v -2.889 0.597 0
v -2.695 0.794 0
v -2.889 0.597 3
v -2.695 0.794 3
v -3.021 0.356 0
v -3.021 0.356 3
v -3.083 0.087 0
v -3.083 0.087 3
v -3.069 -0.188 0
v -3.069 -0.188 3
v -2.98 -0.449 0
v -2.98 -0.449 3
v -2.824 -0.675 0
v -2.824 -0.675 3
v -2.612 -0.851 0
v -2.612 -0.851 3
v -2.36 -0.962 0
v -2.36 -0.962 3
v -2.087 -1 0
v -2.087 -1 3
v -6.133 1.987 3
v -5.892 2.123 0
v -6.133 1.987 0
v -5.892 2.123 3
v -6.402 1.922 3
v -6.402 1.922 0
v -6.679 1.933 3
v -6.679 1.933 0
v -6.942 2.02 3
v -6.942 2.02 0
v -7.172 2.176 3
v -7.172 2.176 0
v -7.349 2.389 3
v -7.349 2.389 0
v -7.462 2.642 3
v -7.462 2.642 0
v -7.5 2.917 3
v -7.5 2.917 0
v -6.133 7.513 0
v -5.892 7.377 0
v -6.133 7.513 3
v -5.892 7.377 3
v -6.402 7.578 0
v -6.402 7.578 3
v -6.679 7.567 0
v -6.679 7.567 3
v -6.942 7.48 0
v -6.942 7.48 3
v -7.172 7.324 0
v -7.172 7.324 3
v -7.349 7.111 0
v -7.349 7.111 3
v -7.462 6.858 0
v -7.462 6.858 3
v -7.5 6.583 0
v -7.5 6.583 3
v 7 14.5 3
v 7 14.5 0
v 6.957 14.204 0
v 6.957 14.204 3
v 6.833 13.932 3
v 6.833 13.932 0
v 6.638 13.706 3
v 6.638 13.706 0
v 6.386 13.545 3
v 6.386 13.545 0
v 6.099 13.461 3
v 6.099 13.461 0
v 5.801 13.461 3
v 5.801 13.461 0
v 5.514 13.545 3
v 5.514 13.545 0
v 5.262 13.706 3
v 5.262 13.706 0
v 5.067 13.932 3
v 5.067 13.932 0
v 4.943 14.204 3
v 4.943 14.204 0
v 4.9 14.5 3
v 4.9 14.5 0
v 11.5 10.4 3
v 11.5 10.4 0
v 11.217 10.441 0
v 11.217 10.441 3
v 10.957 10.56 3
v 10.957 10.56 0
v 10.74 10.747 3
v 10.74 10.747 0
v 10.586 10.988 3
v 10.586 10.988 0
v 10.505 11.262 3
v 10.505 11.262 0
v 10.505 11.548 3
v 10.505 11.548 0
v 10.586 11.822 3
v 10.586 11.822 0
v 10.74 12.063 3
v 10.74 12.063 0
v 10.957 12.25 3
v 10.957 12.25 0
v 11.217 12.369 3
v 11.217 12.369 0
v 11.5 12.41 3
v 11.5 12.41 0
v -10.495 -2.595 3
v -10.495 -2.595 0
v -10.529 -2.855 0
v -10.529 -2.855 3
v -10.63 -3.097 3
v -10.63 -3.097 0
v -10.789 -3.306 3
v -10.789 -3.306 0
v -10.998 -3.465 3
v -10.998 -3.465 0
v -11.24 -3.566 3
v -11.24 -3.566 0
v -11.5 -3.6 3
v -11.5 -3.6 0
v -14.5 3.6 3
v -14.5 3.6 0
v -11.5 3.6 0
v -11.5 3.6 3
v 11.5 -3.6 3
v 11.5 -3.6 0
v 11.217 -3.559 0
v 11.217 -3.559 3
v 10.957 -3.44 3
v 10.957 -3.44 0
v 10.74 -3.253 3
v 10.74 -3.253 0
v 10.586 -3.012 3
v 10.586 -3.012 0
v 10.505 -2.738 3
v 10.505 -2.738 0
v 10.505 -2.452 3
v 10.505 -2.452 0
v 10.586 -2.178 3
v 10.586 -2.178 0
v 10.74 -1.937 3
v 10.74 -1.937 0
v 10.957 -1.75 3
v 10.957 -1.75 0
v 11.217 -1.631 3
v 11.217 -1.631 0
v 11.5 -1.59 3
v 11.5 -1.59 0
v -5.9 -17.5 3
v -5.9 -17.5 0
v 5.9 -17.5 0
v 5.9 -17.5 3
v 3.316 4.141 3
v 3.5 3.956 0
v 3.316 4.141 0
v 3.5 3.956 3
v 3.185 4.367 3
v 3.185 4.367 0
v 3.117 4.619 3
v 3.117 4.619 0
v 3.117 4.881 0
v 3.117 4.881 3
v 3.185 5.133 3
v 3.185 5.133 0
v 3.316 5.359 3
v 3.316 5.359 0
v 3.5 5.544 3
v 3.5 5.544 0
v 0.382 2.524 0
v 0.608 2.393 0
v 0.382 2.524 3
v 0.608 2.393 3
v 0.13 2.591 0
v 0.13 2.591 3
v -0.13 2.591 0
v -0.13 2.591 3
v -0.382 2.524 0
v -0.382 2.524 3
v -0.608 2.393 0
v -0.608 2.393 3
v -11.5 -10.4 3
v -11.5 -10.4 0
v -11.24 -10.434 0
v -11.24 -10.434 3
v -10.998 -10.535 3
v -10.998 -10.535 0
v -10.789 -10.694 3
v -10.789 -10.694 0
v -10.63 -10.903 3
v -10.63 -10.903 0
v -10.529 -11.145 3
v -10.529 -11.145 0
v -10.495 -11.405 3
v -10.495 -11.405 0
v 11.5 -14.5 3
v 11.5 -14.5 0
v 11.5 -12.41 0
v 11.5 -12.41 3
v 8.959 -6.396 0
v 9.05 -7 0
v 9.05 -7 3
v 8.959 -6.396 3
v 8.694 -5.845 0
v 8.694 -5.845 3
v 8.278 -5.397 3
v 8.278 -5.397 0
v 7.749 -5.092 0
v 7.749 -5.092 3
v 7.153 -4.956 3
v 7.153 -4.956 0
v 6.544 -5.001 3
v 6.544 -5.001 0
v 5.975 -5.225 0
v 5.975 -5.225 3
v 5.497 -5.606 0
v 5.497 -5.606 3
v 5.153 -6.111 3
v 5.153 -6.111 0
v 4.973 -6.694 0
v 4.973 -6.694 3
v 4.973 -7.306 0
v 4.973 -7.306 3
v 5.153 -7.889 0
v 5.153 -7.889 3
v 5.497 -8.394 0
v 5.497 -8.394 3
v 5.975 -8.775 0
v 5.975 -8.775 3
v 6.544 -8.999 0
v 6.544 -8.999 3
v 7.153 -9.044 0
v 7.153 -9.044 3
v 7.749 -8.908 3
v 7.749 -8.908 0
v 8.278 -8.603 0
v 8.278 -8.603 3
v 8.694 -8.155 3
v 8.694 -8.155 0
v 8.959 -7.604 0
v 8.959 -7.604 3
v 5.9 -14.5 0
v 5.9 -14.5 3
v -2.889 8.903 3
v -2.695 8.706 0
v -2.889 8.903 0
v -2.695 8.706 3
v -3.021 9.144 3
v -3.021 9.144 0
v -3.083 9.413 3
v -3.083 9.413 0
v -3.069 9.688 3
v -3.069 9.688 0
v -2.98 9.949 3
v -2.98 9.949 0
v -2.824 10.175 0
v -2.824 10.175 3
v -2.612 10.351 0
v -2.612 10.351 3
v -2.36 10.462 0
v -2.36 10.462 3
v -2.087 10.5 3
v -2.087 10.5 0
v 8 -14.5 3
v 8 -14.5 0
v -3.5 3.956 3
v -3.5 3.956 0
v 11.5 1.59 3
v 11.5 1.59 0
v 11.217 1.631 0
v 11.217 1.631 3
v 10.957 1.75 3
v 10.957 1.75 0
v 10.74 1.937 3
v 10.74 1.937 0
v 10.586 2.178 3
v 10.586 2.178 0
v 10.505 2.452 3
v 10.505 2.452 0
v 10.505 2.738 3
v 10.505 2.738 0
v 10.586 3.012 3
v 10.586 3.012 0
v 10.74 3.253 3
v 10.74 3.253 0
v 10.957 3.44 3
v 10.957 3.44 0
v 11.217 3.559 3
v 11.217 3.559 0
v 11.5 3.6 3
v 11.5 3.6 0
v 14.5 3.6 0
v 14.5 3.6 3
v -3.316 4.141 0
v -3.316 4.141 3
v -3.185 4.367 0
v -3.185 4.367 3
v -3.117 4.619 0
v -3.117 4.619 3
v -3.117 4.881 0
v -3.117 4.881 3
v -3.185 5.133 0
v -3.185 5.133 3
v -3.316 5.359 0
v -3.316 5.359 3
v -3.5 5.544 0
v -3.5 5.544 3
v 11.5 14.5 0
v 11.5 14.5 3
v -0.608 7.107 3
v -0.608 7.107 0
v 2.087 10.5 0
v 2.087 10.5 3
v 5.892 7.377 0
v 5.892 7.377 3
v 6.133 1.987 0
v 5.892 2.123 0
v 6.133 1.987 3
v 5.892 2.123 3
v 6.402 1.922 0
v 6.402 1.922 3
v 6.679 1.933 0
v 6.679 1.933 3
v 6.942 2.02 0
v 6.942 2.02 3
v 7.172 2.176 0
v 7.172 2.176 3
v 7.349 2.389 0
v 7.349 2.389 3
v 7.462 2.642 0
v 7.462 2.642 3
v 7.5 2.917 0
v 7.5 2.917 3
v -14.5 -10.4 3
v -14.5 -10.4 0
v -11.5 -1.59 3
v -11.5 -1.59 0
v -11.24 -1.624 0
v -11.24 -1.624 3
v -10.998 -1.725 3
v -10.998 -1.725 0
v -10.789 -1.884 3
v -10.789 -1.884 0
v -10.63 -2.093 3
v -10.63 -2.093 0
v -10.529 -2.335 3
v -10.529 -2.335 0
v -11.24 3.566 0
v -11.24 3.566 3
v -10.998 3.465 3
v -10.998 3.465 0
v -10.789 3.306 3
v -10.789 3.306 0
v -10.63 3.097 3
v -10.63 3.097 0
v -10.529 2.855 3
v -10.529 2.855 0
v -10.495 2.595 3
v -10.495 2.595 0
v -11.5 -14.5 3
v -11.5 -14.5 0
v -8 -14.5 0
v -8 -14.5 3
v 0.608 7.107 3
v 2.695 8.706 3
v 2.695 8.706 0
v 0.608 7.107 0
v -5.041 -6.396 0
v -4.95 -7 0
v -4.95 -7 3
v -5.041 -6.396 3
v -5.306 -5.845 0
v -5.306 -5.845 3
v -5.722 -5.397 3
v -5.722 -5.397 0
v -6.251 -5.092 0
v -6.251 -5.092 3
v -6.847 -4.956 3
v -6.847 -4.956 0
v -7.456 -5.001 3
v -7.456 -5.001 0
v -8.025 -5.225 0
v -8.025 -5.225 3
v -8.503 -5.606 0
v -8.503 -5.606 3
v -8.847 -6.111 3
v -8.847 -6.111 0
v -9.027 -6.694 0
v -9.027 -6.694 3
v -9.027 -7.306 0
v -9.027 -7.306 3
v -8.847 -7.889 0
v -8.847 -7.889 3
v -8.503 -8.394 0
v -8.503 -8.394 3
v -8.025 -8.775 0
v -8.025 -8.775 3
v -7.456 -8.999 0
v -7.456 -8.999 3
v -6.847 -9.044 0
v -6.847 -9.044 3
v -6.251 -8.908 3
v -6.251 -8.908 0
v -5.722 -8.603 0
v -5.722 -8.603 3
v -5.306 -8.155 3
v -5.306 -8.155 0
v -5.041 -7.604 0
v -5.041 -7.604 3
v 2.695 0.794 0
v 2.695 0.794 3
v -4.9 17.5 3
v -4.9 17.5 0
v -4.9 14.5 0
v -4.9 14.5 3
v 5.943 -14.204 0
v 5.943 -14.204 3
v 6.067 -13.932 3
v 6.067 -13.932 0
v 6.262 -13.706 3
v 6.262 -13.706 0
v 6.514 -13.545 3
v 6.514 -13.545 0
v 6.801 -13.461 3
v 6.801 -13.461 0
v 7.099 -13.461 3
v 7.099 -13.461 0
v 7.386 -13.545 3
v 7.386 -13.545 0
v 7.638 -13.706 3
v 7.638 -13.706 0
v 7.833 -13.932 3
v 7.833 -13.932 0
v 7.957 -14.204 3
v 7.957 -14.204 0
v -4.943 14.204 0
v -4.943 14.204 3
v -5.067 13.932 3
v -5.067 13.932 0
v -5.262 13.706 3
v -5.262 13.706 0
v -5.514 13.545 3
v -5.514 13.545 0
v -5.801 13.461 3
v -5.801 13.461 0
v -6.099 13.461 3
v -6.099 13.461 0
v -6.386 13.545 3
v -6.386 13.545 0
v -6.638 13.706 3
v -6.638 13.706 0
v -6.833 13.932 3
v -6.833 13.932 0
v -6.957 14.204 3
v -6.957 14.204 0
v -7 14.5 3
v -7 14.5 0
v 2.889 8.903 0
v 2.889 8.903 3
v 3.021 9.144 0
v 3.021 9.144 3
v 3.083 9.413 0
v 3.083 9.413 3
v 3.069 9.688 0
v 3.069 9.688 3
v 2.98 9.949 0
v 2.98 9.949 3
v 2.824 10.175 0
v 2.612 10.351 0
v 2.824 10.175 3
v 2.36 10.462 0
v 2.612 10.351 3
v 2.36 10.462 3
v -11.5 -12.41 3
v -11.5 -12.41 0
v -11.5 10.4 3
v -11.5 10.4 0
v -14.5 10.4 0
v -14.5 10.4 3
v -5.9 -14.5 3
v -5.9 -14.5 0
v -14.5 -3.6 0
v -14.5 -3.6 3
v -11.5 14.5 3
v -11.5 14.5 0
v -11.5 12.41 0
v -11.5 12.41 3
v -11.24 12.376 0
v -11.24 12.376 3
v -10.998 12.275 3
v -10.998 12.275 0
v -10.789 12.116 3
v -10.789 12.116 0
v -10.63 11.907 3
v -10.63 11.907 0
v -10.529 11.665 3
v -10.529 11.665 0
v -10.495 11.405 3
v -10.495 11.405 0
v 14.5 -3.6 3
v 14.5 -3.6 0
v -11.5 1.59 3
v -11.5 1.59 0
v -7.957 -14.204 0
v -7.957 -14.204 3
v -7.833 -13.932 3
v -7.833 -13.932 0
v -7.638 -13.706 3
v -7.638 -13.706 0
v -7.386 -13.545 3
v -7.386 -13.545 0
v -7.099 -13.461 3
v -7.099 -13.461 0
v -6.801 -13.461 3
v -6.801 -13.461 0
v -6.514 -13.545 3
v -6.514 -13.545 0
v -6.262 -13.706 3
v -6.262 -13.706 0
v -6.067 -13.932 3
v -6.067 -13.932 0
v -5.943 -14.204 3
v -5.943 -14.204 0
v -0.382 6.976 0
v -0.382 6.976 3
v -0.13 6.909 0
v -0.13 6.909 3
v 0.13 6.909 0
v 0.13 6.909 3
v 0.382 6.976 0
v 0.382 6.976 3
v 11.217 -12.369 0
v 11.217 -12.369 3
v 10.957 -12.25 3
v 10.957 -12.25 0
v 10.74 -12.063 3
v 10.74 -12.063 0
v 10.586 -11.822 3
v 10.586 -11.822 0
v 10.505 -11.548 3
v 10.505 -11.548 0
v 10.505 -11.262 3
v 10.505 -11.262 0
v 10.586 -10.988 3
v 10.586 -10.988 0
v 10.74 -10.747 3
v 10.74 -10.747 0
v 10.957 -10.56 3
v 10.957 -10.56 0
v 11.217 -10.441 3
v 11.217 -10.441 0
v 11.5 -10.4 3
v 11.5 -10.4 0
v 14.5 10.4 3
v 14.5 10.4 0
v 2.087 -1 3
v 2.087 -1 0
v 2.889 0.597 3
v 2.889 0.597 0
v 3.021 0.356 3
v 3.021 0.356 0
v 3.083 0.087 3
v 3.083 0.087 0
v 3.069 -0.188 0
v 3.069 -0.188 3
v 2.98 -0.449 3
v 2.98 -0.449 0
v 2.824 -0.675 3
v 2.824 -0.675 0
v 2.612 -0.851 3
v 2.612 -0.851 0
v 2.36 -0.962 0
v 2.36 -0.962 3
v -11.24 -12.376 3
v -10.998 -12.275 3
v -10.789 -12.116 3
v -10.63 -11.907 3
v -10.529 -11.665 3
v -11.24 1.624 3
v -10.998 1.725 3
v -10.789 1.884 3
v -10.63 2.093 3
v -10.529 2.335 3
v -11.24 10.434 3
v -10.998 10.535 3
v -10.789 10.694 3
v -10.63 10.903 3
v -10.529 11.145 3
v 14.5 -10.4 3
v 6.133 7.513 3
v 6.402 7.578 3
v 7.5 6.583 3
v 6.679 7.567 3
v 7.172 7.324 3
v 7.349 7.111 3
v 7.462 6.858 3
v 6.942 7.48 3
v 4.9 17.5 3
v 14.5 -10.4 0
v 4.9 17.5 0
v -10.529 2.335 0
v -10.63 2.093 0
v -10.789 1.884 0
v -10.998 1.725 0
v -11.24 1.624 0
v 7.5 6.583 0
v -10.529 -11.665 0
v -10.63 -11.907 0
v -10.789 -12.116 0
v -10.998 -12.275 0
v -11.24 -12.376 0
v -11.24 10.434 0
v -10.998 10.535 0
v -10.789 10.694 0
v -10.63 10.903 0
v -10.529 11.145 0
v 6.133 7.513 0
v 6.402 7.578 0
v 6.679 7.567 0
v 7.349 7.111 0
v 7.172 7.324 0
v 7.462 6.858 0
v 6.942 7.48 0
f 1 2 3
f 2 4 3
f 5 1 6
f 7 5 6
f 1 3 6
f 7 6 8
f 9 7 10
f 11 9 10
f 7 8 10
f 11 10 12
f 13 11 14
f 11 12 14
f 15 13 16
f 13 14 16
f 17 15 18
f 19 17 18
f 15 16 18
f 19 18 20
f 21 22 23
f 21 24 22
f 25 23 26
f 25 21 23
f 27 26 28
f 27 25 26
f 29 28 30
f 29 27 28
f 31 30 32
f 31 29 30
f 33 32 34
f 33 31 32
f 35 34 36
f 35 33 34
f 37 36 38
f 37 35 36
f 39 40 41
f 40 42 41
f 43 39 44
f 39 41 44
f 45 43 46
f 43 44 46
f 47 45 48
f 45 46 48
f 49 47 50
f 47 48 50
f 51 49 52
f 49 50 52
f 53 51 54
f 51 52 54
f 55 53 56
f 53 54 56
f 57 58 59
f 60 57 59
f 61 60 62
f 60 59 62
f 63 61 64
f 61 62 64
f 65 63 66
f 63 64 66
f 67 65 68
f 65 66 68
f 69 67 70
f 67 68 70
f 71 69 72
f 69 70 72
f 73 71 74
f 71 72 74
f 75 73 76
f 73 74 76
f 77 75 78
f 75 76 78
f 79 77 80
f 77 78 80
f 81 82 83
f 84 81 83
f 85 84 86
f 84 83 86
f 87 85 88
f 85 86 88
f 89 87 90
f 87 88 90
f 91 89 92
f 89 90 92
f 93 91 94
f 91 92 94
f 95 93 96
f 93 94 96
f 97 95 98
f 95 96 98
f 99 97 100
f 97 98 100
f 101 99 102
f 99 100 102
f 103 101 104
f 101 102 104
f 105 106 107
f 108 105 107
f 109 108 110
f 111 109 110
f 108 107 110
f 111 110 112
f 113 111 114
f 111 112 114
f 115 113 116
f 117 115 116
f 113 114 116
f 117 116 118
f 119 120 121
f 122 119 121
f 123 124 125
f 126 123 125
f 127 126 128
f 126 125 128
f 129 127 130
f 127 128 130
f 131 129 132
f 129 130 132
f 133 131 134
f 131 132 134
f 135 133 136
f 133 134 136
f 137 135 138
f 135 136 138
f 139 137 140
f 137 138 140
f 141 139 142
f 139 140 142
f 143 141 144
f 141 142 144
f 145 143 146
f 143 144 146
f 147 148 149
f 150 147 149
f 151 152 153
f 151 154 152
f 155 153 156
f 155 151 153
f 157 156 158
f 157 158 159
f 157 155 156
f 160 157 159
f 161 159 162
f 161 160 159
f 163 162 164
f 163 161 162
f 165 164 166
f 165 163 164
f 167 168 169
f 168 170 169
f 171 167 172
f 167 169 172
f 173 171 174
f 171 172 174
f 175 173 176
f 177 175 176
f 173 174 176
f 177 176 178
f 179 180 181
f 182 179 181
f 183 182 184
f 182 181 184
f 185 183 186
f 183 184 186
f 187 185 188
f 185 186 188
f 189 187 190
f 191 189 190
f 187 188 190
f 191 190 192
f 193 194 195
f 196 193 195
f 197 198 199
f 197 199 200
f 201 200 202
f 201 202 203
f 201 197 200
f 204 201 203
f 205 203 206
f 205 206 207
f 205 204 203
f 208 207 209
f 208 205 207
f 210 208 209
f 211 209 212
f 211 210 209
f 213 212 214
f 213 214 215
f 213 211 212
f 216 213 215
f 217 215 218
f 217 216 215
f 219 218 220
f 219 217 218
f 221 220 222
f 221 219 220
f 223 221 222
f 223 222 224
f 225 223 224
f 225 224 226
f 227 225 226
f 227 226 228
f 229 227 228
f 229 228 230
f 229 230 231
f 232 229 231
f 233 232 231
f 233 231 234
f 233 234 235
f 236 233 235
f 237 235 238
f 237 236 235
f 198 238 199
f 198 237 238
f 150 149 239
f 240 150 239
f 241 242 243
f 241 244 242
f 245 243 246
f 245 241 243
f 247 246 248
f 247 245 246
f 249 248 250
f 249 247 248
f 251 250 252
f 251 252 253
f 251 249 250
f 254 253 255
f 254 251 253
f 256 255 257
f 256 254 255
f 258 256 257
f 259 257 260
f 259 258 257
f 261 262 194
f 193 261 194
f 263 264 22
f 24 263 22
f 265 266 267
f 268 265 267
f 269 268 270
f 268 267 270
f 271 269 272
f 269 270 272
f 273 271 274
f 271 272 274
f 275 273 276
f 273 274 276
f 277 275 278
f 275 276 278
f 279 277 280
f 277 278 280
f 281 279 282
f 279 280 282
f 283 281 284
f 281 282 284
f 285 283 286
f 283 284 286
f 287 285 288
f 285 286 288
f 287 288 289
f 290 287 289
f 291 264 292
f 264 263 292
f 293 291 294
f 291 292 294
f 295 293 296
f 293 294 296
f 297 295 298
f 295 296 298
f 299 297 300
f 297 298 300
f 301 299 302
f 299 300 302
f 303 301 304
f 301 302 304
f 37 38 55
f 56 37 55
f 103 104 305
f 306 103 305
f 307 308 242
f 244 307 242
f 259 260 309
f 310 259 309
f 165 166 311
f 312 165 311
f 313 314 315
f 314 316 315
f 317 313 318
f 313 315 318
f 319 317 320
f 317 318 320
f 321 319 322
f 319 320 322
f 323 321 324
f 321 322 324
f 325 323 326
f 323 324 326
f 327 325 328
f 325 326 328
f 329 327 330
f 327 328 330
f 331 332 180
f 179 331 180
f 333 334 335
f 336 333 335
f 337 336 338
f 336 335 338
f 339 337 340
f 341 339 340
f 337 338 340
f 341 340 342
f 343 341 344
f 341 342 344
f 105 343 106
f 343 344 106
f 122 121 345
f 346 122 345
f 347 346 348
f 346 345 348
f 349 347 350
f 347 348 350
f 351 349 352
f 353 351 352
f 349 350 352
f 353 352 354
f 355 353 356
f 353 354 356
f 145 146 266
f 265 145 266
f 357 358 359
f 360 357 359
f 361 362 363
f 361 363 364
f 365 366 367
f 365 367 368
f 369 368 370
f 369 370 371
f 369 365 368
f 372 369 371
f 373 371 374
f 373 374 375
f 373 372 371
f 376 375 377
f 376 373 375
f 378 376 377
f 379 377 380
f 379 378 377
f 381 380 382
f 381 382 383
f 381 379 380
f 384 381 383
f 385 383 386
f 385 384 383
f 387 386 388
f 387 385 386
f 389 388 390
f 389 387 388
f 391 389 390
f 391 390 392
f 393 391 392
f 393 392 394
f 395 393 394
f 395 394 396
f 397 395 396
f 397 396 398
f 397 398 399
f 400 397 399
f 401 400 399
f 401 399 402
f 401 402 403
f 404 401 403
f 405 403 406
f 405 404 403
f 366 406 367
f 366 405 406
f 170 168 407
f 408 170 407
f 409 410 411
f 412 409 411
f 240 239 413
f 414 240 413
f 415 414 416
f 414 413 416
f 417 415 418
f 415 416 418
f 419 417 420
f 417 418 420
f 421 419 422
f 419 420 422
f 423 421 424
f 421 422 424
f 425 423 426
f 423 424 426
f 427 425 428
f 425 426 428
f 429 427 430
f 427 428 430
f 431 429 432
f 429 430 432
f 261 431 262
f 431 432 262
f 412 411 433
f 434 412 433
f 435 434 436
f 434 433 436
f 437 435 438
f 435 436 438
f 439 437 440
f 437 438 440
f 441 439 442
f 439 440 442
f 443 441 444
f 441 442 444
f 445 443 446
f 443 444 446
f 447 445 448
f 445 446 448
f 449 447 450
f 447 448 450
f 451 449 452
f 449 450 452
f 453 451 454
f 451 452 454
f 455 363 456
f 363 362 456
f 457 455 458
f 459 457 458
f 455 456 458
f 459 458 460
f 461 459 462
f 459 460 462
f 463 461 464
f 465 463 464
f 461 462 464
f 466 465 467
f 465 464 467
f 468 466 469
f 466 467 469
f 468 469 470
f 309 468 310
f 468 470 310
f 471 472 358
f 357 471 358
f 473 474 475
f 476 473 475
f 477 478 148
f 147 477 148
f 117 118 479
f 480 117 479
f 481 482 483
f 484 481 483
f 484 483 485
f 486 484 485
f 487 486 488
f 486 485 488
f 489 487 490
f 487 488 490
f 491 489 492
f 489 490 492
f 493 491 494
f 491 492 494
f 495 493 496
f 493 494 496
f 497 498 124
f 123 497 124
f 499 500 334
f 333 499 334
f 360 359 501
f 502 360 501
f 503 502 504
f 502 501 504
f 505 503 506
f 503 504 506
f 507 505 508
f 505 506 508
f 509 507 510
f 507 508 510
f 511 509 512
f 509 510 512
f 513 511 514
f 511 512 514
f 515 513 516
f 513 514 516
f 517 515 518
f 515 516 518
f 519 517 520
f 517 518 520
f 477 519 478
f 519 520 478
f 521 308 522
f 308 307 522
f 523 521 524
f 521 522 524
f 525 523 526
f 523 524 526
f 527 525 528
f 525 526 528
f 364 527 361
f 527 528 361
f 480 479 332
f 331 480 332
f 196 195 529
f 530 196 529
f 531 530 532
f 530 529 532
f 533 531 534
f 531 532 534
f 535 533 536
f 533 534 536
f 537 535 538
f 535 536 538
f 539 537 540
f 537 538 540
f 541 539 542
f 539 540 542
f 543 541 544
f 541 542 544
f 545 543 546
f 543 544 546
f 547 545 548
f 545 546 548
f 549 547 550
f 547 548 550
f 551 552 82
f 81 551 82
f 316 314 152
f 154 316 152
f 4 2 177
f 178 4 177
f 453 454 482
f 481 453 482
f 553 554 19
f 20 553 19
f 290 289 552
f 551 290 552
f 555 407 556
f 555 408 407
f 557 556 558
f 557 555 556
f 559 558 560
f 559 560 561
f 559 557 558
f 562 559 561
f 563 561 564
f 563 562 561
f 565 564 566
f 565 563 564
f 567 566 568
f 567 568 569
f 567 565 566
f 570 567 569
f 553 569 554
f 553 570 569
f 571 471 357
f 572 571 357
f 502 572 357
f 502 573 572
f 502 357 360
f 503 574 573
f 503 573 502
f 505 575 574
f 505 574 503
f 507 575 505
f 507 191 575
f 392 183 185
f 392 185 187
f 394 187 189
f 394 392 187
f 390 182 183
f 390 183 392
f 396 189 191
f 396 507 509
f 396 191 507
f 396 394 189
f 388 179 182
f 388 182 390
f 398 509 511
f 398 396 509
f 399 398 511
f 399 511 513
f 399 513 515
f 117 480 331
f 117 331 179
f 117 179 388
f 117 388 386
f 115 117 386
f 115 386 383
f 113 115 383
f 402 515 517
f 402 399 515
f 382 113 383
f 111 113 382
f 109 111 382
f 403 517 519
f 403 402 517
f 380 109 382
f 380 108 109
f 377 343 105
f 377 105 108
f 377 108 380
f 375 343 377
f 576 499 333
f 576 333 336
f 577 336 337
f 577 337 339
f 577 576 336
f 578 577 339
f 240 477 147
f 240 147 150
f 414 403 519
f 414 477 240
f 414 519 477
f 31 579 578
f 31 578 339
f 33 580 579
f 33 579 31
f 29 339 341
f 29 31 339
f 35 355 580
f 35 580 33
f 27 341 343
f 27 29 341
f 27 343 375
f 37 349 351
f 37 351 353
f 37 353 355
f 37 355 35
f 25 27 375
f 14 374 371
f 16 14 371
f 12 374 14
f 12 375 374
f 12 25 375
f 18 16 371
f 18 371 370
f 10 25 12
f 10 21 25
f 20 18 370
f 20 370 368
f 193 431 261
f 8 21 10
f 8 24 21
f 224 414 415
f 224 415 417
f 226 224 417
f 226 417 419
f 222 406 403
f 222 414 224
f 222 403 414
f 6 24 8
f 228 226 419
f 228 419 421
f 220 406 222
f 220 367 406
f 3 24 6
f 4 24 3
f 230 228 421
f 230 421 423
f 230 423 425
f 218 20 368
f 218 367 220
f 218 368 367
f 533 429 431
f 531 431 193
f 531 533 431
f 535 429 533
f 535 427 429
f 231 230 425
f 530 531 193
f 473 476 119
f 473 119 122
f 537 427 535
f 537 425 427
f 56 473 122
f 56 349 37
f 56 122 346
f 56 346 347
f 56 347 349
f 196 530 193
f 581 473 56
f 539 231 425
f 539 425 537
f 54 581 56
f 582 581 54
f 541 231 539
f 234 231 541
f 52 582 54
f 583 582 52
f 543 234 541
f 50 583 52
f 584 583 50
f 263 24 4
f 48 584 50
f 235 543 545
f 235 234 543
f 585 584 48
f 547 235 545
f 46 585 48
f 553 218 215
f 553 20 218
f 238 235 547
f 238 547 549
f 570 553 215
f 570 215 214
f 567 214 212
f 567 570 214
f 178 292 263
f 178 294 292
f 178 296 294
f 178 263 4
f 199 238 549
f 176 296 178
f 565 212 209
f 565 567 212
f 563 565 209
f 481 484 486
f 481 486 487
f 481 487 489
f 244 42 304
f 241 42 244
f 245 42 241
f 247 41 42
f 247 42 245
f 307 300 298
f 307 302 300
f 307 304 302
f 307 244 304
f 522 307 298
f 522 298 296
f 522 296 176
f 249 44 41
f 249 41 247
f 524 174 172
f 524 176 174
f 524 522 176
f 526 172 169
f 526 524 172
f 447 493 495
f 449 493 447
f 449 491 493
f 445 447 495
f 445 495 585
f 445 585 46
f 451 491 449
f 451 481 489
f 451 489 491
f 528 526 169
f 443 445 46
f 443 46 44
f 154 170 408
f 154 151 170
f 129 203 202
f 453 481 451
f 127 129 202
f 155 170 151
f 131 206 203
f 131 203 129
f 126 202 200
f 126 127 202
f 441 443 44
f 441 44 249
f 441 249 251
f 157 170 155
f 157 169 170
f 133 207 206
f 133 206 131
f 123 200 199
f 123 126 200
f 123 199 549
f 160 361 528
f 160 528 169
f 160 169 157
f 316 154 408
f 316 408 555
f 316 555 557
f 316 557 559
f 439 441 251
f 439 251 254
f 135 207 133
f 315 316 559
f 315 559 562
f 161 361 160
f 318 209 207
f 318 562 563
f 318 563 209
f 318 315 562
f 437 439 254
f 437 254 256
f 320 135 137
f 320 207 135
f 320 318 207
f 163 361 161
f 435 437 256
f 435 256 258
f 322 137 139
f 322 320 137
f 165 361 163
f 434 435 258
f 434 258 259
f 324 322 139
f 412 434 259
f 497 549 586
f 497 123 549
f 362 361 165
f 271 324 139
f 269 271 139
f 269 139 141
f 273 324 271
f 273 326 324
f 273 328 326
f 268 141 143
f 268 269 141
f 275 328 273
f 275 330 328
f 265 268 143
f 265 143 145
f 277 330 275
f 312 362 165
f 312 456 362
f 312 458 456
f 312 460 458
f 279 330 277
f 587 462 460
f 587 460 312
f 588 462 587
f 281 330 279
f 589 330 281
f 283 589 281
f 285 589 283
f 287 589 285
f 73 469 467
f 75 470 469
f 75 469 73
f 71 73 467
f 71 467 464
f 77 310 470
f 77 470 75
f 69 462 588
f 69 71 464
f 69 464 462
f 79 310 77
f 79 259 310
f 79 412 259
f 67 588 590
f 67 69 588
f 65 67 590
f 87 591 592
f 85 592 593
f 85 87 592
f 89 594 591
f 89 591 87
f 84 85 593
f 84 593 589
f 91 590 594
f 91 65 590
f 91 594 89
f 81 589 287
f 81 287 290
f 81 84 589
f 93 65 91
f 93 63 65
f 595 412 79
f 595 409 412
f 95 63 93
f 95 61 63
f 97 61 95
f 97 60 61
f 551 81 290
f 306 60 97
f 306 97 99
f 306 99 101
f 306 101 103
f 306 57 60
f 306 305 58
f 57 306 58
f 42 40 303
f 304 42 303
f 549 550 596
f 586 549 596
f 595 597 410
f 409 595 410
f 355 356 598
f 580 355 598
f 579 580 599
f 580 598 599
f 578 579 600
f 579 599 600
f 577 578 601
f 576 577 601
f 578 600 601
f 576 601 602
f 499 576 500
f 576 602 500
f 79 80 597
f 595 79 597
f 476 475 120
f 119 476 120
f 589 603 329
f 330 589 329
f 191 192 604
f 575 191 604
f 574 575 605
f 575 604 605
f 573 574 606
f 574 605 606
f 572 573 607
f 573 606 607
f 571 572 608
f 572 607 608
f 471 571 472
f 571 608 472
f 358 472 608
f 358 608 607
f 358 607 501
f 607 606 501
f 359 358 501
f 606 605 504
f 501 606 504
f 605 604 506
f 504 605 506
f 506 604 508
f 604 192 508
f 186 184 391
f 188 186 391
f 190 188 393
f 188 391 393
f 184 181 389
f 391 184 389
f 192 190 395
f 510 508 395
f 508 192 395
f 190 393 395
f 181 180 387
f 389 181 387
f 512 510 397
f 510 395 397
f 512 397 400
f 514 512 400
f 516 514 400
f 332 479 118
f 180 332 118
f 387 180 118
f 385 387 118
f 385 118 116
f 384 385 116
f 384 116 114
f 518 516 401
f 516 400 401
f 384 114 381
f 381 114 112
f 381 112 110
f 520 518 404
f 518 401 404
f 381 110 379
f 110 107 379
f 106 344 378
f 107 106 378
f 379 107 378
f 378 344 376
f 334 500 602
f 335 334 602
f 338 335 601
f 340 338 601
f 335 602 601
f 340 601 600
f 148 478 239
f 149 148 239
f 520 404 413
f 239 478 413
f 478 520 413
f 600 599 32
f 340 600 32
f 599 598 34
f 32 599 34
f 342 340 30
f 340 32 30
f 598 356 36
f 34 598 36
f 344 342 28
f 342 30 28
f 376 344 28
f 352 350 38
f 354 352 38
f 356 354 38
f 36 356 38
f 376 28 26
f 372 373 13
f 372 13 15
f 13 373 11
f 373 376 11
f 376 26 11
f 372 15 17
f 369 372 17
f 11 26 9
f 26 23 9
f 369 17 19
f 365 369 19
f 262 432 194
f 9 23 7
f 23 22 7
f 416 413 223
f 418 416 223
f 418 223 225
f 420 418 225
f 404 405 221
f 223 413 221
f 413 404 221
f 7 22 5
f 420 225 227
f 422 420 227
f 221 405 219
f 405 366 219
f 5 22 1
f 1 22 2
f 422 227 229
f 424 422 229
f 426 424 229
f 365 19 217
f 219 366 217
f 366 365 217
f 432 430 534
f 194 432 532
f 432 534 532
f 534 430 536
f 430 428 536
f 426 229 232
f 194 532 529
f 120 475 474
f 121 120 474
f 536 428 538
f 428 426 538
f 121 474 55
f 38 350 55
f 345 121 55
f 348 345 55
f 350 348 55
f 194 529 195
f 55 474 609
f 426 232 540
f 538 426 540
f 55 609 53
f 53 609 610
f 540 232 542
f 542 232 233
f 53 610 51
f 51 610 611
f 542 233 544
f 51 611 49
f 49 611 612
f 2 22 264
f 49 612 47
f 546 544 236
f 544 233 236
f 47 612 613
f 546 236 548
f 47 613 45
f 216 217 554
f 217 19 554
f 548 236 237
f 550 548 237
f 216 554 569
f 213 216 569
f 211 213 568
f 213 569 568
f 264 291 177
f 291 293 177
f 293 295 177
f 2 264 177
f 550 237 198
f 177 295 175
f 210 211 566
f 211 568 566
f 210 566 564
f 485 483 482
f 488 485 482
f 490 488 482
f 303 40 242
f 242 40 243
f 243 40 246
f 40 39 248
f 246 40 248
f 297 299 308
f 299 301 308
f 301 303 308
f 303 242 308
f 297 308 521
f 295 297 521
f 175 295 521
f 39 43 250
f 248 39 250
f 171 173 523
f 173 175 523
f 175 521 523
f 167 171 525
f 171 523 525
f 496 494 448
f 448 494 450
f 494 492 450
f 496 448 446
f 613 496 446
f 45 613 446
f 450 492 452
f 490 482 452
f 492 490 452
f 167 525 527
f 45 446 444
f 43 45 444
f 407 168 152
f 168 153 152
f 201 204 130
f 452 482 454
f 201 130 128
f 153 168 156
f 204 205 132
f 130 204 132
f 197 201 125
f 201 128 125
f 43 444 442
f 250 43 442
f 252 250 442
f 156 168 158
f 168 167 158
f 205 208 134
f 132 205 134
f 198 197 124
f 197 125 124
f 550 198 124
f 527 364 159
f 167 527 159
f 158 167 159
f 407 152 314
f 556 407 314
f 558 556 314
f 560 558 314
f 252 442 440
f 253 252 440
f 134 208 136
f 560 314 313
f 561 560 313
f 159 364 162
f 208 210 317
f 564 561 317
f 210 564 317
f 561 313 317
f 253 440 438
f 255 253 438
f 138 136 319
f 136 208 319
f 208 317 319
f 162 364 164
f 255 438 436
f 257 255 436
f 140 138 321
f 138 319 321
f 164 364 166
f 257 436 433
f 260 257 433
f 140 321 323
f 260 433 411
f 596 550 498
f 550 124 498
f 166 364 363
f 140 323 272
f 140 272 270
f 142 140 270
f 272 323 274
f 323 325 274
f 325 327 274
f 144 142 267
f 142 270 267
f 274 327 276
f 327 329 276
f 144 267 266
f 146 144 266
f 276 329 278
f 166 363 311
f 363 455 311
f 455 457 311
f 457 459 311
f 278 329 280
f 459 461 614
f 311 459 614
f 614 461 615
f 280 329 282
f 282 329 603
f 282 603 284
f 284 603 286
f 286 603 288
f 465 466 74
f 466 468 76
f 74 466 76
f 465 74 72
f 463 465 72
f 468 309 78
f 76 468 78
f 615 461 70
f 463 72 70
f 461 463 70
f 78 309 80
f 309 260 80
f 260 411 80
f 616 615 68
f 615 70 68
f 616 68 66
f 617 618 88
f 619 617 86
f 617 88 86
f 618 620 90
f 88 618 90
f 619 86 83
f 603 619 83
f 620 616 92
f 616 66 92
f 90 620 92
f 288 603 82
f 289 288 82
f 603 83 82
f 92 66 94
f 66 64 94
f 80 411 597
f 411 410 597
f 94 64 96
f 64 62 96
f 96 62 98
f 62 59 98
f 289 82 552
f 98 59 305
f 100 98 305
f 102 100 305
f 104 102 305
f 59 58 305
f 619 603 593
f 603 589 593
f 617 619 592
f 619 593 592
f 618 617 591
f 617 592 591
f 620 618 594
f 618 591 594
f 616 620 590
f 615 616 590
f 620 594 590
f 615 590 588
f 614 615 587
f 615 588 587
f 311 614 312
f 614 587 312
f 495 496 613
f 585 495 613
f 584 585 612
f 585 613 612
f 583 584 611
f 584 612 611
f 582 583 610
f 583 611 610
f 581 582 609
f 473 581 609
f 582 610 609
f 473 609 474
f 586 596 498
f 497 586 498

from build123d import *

# Parameters (mm, degrees)
SKETCH_1_R      = 2.05
EXTRUDE_1_DEPTH = 3
FILLET_1_R      = 1


with BuildPart() as part:
    # 草图1 → 凸台-拉伸1 (new body)
    with BuildSketch(Plane.XY):
        with BuildLine():
            Line((8, -14.5), (11.5, -14.5))
            Line((11.5, -14.5), (11.5, -12.41))
            ThreePointArc((11.5, -12.41), (10.495, -11.405), (11.5, -10.4))
            Line((11.5, -10.4), (14.5, -10.4))
            Line((14.5, -10.4), (14.5, -3.6))
            Line((14.5, -3.6), (11.5, -3.6))
            ThreePointArc((11.5, -3.6), (10.495, -2.595), (11.5, -1.59))
            Line((11.5, -1.59), (11.5, 1.59))
            ThreePointArc((11.5, 1.59), (10.495, 2.595), (11.5, 3.6))
            Line((11.5, 3.6), (14.5, 3.6))
            Line((14.5, 3.6), (14.5, 10.4))
            Line((14.5, 10.4), (11.5, 10.4))
            ThreePointArc((11.5, 10.4), (10.495, 11.405), (11.5, 12.41))
            Line((11.5, 12.41), (11.5, 14.5))
            Line((11.5, 14.5), (7, 14.5))
            ThreePointArc((7, 14.5), (5.95, 13.45), (4.9, 14.5))
            Line((4.9, 14.5), (4.9, 17.5))
            Line((4.9, 17.5), (-4.9, 17.5))
            Line((-4.9, 17.5), (-4.9, 14.5))
            ThreePointArc((-4.9, 14.5), (-5.95, 13.45), (-7, 14.5))
            Line((-7, 14.5), (-11.5, 14.5))
            Line((-11.5, 14.5), (-11.5, 12.41))
            ThreePointArc((-11.5, 12.41), (-10.789357685, 12.115642315), (-10.495, 11.405))
            ThreePointArc((-10.495, 11.405), (-10.789357685, 10.694357685), (-11.5, 10.4))
            Line((-11.5, 10.4), (-14.5, 10.4))
            Line((-14.5, 10.4), (-14.5, 3.6))
            Line((-14.5, 3.6), (-11.5, 3.6))
            ThreePointArc((-11.5, 3.6), (-10.789357685, 3.305642315), (-10.495, 2.595))
            ThreePointArc((-10.495, 2.595), (-10.789357685, 1.884357685), (-11.5, 1.59))
            Line((-11.5, 1.59), (-11.5, -1.59))
            ThreePointArc((-11.5, -1.59), (-10.789357685, -1.884357685), (-10.495, -2.595))
            ThreePointArc((-10.495, -2.595), (-10.789357685, -3.305642315), (-11.5, -3.6))
            Line((-11.5, -3.6), (-14.5, -3.6))
            Line((-14.5, -3.6), (-14.5, -10.4))
            Line((-14.5, -10.4), (-11.5, -10.4))
            ThreePointArc((-11.5, -10.4), (-10.789357685, -10.694357685), (-10.495, -11.405))
            ThreePointArc((-10.495, -11.405), (-10.789357685, -12.115642315), (-11.5, -12.41))
            Line((-11.5, -12.41), (-11.5, -14.5))
            Line((-11.5, -14.5), (-8, -14.5))
            ThreePointArc((-8, -14.5), (-6.95, -13.45), (-5.9, -14.5))
            Line((-5.9, -14.5), (-5.9, -17.5))
            Line((-5.9, -17.5), (5.9, -17.5))
            Line((5.9, -17.5), (5.9, -14.5))
            ThreePointArc((5.9, -14.5), (6.95, -13.45), (8, -14.5))
        make_face()
        with Locations((-7, -7)):
            Circle(SKETCH_1_R, mode=Mode.SUBTRACT)
        with Locations((7, -7)):
            Circle(SKETCH_1_R, mode=Mode.SUBTRACT)
        Polygon((-7.5, 0.890105817), (-7.5, 8.609894183), (-2.465355414, 4.75), align=None, mode=Mode.SUBTRACT)
        Polygon((5.034644586, -1), (-5.034644586, -1), (0, 2.859894183), align=None, mode=Mode.SUBTRACT)
        Polygon((-5.034644586, 10.5), (5.034644586, 10.5), (0, 6.640105817), align=None, mode=Mode.SUBTRACT)
        Polygon((2.465355414, 4.75), (7.5, 8.609894183), (7.5, 0.890105817), align=None, mode=Mode.SUBTRACT)
    extrude(amount=EXTRUDE_1_DEPTH)

    # 圆角1
    fillet_1_edges = [part.edges().sort_by_distance(p)[0] for p in [
        (5.034644586, -1, 1.5),
        (0, 2.859894183, 1.5),
        (-7.5, 8.609894183, 1.5),
        (-7.5, 0.890105817, 1.5),
        (-2.465355414, 4.75, 1.5),
        (0, 6.640105817, 1.5),
        (5.034644586, 10.5, 1.5),
        (-5.034644586, 10.5, 1.5),
        (7.5, 0.890105817, 1.5),
        (7.5, 8.609894183, 1.5),
        (2.465355414, 4.75, 1.5),
        (-5.034644586, -1, 1.5),
    ]]
    fillet(fillet_1_edges, radius=FILLET_1_R)


solid = part.part
